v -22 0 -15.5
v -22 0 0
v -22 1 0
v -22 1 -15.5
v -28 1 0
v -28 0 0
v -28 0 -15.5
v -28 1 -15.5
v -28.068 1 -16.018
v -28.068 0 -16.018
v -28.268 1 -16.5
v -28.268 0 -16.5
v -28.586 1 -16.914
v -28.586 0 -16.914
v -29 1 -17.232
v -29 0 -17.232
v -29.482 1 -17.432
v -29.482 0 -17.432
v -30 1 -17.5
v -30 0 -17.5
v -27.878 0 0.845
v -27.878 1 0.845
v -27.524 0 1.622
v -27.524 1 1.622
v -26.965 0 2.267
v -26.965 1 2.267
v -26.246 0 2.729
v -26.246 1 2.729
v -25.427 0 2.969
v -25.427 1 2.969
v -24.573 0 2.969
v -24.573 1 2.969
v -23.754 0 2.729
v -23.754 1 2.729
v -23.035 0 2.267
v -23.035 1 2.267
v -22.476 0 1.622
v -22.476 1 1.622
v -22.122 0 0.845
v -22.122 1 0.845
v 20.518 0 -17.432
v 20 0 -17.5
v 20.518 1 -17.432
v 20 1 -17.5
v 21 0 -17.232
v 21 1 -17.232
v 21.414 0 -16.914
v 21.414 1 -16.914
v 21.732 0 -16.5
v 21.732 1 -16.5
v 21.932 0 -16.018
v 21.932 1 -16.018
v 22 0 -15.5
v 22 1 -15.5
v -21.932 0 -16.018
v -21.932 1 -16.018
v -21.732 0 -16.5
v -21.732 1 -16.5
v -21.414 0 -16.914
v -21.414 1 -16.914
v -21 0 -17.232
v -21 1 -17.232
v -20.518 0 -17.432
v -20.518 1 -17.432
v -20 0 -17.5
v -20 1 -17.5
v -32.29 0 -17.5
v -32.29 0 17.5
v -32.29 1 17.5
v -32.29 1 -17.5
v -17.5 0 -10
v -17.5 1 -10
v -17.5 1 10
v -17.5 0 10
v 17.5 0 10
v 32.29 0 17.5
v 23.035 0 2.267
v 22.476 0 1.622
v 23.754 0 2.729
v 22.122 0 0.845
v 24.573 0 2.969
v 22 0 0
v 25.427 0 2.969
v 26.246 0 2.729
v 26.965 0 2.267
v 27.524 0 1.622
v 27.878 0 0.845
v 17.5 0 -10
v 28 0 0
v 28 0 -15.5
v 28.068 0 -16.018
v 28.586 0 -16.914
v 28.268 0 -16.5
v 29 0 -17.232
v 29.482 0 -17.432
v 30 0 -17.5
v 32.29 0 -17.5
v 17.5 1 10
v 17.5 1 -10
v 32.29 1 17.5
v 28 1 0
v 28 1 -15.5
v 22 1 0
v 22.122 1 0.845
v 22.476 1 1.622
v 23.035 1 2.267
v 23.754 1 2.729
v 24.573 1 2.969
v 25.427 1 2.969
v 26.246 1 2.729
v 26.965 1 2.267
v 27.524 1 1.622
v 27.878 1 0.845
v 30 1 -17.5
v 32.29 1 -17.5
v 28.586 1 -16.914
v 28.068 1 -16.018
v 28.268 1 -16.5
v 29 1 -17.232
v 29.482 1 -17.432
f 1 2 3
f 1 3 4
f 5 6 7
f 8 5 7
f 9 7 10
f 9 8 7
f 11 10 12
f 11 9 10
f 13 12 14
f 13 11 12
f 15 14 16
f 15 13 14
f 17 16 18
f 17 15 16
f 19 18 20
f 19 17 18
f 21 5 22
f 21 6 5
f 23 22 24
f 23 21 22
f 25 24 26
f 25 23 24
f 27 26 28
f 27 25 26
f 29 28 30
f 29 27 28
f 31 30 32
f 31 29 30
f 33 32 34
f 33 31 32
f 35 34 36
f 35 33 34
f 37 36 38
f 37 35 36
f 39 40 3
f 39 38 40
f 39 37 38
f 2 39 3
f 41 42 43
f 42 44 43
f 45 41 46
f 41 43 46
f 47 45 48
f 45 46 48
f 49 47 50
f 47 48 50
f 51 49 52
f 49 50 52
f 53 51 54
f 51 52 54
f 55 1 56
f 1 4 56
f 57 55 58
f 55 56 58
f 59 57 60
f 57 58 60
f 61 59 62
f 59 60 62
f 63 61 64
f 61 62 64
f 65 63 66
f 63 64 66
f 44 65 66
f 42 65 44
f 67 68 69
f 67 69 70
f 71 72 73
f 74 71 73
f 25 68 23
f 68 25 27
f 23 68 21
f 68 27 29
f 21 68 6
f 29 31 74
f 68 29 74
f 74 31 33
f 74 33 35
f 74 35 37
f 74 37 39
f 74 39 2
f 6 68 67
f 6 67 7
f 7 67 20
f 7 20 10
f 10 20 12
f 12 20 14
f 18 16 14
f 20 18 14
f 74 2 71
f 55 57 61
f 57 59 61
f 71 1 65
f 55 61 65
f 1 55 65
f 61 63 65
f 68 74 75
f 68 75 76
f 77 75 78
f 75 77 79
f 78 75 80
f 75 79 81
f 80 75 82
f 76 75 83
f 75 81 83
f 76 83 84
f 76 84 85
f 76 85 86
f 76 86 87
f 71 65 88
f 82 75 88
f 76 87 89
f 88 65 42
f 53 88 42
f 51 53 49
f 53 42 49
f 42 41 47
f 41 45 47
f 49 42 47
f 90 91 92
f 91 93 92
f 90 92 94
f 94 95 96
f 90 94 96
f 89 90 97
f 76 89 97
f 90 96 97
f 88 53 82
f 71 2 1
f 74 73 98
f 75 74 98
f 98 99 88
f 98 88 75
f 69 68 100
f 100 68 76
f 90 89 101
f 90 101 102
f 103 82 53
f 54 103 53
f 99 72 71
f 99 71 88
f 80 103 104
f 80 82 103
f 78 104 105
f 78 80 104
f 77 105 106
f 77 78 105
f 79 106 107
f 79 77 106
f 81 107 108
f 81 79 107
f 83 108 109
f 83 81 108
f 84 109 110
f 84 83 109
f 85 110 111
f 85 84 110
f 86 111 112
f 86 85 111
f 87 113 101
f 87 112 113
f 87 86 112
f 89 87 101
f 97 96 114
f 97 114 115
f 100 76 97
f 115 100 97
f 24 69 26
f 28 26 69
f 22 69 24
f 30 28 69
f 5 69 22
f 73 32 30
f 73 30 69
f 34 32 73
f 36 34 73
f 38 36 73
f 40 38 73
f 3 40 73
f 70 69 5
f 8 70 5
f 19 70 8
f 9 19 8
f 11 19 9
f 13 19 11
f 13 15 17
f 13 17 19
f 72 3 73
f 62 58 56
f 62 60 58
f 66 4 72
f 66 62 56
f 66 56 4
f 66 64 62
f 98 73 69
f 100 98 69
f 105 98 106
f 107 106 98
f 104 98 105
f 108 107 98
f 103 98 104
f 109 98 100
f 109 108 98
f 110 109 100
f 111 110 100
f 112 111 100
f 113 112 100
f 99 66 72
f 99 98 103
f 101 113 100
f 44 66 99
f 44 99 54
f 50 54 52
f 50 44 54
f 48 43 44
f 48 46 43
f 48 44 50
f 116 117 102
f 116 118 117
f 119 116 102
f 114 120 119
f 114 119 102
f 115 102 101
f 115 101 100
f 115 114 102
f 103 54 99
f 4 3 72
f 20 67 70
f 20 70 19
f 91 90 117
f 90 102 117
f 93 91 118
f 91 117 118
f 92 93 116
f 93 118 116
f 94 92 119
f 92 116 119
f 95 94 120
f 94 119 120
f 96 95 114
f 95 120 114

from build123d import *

# Parameters (mm, degrees)
SKETCH1_W               = 64.58
SKETCH1_H               = 35
SKETCH1_R               = 3
BOSS_EXTRUDE1_DEPTH     = 1
CUT_EXTRUDE1_DEPTH      = 37.740904997
CUT_EXTRUDE1_DEPTH_BACK = 37.740904997
SKETCH2_W               = 6
SKETCH2_H               = 17.5
FILLET1_R               = 2
CUT_EXTRUDE2_DEPTH      = 37.740904997
CUT_EXTRUDE2_DEPTH_BACK = 37.740904997
SKETCH3_W               = 35
SKETCH3_H               = 20


with BuildPart() as part:
    # Sketch1 → Boss-Extrude1 (new body)
    with BuildSketch(Plane(origin=(0, 0, 0), x_dir=(1, 0, 0), z_dir=(0, 1, 0))):
        Rectangle(SKETCH1_W, SKETCH1_H)
        with Locations(Location((-25, 0, 0), (0, 0, 270))):
            Circle(SKETCH1_R, mode=Mode.SUBTRACT)
        with Locations(Location((25, 0, 0), (0, 0, 270))):
            Circle(SKETCH1_R, mode=Mode.SUBTRACT)
    extrude(amount=BOSS_EXTRUDE1_DEPTH)

    # Sketch2 → Cut-Extrude1 (cut, two sides: drawn at the far end of the back side and taken through both)
    with BuildSketch(Plane(origin=(0, 1, 0), x_dir=(1, 0, 0), z_dir=(0, 1, 0)).offset(-CUT_EXTRUDE1_DEPTH_BACK)):
        with Locations((-25, 8.75)):
            Rectangle(SKETCH2_W, SKETCH2_H)
        with Locations((25, 8.75)):
            Rectangle(SKETCH2_W, SKETCH2_H)
    extrude(amount=CUT_EXTRUDE1_DEPTH + CUT_EXTRUDE1_DEPTH_BACK, mode=Mode.SUBTRACT)

    # Fillet1
    fillet1_edges = [part.edges().sort_by_distance(p)[0] for p in [
        (22, 0.5, -17.5),
        (-28, 0.5, -17.5),
        (-22, 0.5, -17.5),
        (28, 0.5, -17.5),
    ]]
    fillet(fillet1_edges, radius=FILLET1_R)

    # Sketch3 → Cut-Extrude2 (cut, two sides: drawn at the far end of the back side and taken through both)
    with BuildSketch(Plane.XZ.offset(-CUT_EXTRUDE2_DEPTH_BACK)):
        Rectangle(SKETCH3_W, SKETCH3_H)
    extrude(amount=CUT_EXTRUDE2_DEPTH + CUT_EXTRUDE2_DEPTH_BACK, mode=Mode.SUBTRACT)


solid = part.part
